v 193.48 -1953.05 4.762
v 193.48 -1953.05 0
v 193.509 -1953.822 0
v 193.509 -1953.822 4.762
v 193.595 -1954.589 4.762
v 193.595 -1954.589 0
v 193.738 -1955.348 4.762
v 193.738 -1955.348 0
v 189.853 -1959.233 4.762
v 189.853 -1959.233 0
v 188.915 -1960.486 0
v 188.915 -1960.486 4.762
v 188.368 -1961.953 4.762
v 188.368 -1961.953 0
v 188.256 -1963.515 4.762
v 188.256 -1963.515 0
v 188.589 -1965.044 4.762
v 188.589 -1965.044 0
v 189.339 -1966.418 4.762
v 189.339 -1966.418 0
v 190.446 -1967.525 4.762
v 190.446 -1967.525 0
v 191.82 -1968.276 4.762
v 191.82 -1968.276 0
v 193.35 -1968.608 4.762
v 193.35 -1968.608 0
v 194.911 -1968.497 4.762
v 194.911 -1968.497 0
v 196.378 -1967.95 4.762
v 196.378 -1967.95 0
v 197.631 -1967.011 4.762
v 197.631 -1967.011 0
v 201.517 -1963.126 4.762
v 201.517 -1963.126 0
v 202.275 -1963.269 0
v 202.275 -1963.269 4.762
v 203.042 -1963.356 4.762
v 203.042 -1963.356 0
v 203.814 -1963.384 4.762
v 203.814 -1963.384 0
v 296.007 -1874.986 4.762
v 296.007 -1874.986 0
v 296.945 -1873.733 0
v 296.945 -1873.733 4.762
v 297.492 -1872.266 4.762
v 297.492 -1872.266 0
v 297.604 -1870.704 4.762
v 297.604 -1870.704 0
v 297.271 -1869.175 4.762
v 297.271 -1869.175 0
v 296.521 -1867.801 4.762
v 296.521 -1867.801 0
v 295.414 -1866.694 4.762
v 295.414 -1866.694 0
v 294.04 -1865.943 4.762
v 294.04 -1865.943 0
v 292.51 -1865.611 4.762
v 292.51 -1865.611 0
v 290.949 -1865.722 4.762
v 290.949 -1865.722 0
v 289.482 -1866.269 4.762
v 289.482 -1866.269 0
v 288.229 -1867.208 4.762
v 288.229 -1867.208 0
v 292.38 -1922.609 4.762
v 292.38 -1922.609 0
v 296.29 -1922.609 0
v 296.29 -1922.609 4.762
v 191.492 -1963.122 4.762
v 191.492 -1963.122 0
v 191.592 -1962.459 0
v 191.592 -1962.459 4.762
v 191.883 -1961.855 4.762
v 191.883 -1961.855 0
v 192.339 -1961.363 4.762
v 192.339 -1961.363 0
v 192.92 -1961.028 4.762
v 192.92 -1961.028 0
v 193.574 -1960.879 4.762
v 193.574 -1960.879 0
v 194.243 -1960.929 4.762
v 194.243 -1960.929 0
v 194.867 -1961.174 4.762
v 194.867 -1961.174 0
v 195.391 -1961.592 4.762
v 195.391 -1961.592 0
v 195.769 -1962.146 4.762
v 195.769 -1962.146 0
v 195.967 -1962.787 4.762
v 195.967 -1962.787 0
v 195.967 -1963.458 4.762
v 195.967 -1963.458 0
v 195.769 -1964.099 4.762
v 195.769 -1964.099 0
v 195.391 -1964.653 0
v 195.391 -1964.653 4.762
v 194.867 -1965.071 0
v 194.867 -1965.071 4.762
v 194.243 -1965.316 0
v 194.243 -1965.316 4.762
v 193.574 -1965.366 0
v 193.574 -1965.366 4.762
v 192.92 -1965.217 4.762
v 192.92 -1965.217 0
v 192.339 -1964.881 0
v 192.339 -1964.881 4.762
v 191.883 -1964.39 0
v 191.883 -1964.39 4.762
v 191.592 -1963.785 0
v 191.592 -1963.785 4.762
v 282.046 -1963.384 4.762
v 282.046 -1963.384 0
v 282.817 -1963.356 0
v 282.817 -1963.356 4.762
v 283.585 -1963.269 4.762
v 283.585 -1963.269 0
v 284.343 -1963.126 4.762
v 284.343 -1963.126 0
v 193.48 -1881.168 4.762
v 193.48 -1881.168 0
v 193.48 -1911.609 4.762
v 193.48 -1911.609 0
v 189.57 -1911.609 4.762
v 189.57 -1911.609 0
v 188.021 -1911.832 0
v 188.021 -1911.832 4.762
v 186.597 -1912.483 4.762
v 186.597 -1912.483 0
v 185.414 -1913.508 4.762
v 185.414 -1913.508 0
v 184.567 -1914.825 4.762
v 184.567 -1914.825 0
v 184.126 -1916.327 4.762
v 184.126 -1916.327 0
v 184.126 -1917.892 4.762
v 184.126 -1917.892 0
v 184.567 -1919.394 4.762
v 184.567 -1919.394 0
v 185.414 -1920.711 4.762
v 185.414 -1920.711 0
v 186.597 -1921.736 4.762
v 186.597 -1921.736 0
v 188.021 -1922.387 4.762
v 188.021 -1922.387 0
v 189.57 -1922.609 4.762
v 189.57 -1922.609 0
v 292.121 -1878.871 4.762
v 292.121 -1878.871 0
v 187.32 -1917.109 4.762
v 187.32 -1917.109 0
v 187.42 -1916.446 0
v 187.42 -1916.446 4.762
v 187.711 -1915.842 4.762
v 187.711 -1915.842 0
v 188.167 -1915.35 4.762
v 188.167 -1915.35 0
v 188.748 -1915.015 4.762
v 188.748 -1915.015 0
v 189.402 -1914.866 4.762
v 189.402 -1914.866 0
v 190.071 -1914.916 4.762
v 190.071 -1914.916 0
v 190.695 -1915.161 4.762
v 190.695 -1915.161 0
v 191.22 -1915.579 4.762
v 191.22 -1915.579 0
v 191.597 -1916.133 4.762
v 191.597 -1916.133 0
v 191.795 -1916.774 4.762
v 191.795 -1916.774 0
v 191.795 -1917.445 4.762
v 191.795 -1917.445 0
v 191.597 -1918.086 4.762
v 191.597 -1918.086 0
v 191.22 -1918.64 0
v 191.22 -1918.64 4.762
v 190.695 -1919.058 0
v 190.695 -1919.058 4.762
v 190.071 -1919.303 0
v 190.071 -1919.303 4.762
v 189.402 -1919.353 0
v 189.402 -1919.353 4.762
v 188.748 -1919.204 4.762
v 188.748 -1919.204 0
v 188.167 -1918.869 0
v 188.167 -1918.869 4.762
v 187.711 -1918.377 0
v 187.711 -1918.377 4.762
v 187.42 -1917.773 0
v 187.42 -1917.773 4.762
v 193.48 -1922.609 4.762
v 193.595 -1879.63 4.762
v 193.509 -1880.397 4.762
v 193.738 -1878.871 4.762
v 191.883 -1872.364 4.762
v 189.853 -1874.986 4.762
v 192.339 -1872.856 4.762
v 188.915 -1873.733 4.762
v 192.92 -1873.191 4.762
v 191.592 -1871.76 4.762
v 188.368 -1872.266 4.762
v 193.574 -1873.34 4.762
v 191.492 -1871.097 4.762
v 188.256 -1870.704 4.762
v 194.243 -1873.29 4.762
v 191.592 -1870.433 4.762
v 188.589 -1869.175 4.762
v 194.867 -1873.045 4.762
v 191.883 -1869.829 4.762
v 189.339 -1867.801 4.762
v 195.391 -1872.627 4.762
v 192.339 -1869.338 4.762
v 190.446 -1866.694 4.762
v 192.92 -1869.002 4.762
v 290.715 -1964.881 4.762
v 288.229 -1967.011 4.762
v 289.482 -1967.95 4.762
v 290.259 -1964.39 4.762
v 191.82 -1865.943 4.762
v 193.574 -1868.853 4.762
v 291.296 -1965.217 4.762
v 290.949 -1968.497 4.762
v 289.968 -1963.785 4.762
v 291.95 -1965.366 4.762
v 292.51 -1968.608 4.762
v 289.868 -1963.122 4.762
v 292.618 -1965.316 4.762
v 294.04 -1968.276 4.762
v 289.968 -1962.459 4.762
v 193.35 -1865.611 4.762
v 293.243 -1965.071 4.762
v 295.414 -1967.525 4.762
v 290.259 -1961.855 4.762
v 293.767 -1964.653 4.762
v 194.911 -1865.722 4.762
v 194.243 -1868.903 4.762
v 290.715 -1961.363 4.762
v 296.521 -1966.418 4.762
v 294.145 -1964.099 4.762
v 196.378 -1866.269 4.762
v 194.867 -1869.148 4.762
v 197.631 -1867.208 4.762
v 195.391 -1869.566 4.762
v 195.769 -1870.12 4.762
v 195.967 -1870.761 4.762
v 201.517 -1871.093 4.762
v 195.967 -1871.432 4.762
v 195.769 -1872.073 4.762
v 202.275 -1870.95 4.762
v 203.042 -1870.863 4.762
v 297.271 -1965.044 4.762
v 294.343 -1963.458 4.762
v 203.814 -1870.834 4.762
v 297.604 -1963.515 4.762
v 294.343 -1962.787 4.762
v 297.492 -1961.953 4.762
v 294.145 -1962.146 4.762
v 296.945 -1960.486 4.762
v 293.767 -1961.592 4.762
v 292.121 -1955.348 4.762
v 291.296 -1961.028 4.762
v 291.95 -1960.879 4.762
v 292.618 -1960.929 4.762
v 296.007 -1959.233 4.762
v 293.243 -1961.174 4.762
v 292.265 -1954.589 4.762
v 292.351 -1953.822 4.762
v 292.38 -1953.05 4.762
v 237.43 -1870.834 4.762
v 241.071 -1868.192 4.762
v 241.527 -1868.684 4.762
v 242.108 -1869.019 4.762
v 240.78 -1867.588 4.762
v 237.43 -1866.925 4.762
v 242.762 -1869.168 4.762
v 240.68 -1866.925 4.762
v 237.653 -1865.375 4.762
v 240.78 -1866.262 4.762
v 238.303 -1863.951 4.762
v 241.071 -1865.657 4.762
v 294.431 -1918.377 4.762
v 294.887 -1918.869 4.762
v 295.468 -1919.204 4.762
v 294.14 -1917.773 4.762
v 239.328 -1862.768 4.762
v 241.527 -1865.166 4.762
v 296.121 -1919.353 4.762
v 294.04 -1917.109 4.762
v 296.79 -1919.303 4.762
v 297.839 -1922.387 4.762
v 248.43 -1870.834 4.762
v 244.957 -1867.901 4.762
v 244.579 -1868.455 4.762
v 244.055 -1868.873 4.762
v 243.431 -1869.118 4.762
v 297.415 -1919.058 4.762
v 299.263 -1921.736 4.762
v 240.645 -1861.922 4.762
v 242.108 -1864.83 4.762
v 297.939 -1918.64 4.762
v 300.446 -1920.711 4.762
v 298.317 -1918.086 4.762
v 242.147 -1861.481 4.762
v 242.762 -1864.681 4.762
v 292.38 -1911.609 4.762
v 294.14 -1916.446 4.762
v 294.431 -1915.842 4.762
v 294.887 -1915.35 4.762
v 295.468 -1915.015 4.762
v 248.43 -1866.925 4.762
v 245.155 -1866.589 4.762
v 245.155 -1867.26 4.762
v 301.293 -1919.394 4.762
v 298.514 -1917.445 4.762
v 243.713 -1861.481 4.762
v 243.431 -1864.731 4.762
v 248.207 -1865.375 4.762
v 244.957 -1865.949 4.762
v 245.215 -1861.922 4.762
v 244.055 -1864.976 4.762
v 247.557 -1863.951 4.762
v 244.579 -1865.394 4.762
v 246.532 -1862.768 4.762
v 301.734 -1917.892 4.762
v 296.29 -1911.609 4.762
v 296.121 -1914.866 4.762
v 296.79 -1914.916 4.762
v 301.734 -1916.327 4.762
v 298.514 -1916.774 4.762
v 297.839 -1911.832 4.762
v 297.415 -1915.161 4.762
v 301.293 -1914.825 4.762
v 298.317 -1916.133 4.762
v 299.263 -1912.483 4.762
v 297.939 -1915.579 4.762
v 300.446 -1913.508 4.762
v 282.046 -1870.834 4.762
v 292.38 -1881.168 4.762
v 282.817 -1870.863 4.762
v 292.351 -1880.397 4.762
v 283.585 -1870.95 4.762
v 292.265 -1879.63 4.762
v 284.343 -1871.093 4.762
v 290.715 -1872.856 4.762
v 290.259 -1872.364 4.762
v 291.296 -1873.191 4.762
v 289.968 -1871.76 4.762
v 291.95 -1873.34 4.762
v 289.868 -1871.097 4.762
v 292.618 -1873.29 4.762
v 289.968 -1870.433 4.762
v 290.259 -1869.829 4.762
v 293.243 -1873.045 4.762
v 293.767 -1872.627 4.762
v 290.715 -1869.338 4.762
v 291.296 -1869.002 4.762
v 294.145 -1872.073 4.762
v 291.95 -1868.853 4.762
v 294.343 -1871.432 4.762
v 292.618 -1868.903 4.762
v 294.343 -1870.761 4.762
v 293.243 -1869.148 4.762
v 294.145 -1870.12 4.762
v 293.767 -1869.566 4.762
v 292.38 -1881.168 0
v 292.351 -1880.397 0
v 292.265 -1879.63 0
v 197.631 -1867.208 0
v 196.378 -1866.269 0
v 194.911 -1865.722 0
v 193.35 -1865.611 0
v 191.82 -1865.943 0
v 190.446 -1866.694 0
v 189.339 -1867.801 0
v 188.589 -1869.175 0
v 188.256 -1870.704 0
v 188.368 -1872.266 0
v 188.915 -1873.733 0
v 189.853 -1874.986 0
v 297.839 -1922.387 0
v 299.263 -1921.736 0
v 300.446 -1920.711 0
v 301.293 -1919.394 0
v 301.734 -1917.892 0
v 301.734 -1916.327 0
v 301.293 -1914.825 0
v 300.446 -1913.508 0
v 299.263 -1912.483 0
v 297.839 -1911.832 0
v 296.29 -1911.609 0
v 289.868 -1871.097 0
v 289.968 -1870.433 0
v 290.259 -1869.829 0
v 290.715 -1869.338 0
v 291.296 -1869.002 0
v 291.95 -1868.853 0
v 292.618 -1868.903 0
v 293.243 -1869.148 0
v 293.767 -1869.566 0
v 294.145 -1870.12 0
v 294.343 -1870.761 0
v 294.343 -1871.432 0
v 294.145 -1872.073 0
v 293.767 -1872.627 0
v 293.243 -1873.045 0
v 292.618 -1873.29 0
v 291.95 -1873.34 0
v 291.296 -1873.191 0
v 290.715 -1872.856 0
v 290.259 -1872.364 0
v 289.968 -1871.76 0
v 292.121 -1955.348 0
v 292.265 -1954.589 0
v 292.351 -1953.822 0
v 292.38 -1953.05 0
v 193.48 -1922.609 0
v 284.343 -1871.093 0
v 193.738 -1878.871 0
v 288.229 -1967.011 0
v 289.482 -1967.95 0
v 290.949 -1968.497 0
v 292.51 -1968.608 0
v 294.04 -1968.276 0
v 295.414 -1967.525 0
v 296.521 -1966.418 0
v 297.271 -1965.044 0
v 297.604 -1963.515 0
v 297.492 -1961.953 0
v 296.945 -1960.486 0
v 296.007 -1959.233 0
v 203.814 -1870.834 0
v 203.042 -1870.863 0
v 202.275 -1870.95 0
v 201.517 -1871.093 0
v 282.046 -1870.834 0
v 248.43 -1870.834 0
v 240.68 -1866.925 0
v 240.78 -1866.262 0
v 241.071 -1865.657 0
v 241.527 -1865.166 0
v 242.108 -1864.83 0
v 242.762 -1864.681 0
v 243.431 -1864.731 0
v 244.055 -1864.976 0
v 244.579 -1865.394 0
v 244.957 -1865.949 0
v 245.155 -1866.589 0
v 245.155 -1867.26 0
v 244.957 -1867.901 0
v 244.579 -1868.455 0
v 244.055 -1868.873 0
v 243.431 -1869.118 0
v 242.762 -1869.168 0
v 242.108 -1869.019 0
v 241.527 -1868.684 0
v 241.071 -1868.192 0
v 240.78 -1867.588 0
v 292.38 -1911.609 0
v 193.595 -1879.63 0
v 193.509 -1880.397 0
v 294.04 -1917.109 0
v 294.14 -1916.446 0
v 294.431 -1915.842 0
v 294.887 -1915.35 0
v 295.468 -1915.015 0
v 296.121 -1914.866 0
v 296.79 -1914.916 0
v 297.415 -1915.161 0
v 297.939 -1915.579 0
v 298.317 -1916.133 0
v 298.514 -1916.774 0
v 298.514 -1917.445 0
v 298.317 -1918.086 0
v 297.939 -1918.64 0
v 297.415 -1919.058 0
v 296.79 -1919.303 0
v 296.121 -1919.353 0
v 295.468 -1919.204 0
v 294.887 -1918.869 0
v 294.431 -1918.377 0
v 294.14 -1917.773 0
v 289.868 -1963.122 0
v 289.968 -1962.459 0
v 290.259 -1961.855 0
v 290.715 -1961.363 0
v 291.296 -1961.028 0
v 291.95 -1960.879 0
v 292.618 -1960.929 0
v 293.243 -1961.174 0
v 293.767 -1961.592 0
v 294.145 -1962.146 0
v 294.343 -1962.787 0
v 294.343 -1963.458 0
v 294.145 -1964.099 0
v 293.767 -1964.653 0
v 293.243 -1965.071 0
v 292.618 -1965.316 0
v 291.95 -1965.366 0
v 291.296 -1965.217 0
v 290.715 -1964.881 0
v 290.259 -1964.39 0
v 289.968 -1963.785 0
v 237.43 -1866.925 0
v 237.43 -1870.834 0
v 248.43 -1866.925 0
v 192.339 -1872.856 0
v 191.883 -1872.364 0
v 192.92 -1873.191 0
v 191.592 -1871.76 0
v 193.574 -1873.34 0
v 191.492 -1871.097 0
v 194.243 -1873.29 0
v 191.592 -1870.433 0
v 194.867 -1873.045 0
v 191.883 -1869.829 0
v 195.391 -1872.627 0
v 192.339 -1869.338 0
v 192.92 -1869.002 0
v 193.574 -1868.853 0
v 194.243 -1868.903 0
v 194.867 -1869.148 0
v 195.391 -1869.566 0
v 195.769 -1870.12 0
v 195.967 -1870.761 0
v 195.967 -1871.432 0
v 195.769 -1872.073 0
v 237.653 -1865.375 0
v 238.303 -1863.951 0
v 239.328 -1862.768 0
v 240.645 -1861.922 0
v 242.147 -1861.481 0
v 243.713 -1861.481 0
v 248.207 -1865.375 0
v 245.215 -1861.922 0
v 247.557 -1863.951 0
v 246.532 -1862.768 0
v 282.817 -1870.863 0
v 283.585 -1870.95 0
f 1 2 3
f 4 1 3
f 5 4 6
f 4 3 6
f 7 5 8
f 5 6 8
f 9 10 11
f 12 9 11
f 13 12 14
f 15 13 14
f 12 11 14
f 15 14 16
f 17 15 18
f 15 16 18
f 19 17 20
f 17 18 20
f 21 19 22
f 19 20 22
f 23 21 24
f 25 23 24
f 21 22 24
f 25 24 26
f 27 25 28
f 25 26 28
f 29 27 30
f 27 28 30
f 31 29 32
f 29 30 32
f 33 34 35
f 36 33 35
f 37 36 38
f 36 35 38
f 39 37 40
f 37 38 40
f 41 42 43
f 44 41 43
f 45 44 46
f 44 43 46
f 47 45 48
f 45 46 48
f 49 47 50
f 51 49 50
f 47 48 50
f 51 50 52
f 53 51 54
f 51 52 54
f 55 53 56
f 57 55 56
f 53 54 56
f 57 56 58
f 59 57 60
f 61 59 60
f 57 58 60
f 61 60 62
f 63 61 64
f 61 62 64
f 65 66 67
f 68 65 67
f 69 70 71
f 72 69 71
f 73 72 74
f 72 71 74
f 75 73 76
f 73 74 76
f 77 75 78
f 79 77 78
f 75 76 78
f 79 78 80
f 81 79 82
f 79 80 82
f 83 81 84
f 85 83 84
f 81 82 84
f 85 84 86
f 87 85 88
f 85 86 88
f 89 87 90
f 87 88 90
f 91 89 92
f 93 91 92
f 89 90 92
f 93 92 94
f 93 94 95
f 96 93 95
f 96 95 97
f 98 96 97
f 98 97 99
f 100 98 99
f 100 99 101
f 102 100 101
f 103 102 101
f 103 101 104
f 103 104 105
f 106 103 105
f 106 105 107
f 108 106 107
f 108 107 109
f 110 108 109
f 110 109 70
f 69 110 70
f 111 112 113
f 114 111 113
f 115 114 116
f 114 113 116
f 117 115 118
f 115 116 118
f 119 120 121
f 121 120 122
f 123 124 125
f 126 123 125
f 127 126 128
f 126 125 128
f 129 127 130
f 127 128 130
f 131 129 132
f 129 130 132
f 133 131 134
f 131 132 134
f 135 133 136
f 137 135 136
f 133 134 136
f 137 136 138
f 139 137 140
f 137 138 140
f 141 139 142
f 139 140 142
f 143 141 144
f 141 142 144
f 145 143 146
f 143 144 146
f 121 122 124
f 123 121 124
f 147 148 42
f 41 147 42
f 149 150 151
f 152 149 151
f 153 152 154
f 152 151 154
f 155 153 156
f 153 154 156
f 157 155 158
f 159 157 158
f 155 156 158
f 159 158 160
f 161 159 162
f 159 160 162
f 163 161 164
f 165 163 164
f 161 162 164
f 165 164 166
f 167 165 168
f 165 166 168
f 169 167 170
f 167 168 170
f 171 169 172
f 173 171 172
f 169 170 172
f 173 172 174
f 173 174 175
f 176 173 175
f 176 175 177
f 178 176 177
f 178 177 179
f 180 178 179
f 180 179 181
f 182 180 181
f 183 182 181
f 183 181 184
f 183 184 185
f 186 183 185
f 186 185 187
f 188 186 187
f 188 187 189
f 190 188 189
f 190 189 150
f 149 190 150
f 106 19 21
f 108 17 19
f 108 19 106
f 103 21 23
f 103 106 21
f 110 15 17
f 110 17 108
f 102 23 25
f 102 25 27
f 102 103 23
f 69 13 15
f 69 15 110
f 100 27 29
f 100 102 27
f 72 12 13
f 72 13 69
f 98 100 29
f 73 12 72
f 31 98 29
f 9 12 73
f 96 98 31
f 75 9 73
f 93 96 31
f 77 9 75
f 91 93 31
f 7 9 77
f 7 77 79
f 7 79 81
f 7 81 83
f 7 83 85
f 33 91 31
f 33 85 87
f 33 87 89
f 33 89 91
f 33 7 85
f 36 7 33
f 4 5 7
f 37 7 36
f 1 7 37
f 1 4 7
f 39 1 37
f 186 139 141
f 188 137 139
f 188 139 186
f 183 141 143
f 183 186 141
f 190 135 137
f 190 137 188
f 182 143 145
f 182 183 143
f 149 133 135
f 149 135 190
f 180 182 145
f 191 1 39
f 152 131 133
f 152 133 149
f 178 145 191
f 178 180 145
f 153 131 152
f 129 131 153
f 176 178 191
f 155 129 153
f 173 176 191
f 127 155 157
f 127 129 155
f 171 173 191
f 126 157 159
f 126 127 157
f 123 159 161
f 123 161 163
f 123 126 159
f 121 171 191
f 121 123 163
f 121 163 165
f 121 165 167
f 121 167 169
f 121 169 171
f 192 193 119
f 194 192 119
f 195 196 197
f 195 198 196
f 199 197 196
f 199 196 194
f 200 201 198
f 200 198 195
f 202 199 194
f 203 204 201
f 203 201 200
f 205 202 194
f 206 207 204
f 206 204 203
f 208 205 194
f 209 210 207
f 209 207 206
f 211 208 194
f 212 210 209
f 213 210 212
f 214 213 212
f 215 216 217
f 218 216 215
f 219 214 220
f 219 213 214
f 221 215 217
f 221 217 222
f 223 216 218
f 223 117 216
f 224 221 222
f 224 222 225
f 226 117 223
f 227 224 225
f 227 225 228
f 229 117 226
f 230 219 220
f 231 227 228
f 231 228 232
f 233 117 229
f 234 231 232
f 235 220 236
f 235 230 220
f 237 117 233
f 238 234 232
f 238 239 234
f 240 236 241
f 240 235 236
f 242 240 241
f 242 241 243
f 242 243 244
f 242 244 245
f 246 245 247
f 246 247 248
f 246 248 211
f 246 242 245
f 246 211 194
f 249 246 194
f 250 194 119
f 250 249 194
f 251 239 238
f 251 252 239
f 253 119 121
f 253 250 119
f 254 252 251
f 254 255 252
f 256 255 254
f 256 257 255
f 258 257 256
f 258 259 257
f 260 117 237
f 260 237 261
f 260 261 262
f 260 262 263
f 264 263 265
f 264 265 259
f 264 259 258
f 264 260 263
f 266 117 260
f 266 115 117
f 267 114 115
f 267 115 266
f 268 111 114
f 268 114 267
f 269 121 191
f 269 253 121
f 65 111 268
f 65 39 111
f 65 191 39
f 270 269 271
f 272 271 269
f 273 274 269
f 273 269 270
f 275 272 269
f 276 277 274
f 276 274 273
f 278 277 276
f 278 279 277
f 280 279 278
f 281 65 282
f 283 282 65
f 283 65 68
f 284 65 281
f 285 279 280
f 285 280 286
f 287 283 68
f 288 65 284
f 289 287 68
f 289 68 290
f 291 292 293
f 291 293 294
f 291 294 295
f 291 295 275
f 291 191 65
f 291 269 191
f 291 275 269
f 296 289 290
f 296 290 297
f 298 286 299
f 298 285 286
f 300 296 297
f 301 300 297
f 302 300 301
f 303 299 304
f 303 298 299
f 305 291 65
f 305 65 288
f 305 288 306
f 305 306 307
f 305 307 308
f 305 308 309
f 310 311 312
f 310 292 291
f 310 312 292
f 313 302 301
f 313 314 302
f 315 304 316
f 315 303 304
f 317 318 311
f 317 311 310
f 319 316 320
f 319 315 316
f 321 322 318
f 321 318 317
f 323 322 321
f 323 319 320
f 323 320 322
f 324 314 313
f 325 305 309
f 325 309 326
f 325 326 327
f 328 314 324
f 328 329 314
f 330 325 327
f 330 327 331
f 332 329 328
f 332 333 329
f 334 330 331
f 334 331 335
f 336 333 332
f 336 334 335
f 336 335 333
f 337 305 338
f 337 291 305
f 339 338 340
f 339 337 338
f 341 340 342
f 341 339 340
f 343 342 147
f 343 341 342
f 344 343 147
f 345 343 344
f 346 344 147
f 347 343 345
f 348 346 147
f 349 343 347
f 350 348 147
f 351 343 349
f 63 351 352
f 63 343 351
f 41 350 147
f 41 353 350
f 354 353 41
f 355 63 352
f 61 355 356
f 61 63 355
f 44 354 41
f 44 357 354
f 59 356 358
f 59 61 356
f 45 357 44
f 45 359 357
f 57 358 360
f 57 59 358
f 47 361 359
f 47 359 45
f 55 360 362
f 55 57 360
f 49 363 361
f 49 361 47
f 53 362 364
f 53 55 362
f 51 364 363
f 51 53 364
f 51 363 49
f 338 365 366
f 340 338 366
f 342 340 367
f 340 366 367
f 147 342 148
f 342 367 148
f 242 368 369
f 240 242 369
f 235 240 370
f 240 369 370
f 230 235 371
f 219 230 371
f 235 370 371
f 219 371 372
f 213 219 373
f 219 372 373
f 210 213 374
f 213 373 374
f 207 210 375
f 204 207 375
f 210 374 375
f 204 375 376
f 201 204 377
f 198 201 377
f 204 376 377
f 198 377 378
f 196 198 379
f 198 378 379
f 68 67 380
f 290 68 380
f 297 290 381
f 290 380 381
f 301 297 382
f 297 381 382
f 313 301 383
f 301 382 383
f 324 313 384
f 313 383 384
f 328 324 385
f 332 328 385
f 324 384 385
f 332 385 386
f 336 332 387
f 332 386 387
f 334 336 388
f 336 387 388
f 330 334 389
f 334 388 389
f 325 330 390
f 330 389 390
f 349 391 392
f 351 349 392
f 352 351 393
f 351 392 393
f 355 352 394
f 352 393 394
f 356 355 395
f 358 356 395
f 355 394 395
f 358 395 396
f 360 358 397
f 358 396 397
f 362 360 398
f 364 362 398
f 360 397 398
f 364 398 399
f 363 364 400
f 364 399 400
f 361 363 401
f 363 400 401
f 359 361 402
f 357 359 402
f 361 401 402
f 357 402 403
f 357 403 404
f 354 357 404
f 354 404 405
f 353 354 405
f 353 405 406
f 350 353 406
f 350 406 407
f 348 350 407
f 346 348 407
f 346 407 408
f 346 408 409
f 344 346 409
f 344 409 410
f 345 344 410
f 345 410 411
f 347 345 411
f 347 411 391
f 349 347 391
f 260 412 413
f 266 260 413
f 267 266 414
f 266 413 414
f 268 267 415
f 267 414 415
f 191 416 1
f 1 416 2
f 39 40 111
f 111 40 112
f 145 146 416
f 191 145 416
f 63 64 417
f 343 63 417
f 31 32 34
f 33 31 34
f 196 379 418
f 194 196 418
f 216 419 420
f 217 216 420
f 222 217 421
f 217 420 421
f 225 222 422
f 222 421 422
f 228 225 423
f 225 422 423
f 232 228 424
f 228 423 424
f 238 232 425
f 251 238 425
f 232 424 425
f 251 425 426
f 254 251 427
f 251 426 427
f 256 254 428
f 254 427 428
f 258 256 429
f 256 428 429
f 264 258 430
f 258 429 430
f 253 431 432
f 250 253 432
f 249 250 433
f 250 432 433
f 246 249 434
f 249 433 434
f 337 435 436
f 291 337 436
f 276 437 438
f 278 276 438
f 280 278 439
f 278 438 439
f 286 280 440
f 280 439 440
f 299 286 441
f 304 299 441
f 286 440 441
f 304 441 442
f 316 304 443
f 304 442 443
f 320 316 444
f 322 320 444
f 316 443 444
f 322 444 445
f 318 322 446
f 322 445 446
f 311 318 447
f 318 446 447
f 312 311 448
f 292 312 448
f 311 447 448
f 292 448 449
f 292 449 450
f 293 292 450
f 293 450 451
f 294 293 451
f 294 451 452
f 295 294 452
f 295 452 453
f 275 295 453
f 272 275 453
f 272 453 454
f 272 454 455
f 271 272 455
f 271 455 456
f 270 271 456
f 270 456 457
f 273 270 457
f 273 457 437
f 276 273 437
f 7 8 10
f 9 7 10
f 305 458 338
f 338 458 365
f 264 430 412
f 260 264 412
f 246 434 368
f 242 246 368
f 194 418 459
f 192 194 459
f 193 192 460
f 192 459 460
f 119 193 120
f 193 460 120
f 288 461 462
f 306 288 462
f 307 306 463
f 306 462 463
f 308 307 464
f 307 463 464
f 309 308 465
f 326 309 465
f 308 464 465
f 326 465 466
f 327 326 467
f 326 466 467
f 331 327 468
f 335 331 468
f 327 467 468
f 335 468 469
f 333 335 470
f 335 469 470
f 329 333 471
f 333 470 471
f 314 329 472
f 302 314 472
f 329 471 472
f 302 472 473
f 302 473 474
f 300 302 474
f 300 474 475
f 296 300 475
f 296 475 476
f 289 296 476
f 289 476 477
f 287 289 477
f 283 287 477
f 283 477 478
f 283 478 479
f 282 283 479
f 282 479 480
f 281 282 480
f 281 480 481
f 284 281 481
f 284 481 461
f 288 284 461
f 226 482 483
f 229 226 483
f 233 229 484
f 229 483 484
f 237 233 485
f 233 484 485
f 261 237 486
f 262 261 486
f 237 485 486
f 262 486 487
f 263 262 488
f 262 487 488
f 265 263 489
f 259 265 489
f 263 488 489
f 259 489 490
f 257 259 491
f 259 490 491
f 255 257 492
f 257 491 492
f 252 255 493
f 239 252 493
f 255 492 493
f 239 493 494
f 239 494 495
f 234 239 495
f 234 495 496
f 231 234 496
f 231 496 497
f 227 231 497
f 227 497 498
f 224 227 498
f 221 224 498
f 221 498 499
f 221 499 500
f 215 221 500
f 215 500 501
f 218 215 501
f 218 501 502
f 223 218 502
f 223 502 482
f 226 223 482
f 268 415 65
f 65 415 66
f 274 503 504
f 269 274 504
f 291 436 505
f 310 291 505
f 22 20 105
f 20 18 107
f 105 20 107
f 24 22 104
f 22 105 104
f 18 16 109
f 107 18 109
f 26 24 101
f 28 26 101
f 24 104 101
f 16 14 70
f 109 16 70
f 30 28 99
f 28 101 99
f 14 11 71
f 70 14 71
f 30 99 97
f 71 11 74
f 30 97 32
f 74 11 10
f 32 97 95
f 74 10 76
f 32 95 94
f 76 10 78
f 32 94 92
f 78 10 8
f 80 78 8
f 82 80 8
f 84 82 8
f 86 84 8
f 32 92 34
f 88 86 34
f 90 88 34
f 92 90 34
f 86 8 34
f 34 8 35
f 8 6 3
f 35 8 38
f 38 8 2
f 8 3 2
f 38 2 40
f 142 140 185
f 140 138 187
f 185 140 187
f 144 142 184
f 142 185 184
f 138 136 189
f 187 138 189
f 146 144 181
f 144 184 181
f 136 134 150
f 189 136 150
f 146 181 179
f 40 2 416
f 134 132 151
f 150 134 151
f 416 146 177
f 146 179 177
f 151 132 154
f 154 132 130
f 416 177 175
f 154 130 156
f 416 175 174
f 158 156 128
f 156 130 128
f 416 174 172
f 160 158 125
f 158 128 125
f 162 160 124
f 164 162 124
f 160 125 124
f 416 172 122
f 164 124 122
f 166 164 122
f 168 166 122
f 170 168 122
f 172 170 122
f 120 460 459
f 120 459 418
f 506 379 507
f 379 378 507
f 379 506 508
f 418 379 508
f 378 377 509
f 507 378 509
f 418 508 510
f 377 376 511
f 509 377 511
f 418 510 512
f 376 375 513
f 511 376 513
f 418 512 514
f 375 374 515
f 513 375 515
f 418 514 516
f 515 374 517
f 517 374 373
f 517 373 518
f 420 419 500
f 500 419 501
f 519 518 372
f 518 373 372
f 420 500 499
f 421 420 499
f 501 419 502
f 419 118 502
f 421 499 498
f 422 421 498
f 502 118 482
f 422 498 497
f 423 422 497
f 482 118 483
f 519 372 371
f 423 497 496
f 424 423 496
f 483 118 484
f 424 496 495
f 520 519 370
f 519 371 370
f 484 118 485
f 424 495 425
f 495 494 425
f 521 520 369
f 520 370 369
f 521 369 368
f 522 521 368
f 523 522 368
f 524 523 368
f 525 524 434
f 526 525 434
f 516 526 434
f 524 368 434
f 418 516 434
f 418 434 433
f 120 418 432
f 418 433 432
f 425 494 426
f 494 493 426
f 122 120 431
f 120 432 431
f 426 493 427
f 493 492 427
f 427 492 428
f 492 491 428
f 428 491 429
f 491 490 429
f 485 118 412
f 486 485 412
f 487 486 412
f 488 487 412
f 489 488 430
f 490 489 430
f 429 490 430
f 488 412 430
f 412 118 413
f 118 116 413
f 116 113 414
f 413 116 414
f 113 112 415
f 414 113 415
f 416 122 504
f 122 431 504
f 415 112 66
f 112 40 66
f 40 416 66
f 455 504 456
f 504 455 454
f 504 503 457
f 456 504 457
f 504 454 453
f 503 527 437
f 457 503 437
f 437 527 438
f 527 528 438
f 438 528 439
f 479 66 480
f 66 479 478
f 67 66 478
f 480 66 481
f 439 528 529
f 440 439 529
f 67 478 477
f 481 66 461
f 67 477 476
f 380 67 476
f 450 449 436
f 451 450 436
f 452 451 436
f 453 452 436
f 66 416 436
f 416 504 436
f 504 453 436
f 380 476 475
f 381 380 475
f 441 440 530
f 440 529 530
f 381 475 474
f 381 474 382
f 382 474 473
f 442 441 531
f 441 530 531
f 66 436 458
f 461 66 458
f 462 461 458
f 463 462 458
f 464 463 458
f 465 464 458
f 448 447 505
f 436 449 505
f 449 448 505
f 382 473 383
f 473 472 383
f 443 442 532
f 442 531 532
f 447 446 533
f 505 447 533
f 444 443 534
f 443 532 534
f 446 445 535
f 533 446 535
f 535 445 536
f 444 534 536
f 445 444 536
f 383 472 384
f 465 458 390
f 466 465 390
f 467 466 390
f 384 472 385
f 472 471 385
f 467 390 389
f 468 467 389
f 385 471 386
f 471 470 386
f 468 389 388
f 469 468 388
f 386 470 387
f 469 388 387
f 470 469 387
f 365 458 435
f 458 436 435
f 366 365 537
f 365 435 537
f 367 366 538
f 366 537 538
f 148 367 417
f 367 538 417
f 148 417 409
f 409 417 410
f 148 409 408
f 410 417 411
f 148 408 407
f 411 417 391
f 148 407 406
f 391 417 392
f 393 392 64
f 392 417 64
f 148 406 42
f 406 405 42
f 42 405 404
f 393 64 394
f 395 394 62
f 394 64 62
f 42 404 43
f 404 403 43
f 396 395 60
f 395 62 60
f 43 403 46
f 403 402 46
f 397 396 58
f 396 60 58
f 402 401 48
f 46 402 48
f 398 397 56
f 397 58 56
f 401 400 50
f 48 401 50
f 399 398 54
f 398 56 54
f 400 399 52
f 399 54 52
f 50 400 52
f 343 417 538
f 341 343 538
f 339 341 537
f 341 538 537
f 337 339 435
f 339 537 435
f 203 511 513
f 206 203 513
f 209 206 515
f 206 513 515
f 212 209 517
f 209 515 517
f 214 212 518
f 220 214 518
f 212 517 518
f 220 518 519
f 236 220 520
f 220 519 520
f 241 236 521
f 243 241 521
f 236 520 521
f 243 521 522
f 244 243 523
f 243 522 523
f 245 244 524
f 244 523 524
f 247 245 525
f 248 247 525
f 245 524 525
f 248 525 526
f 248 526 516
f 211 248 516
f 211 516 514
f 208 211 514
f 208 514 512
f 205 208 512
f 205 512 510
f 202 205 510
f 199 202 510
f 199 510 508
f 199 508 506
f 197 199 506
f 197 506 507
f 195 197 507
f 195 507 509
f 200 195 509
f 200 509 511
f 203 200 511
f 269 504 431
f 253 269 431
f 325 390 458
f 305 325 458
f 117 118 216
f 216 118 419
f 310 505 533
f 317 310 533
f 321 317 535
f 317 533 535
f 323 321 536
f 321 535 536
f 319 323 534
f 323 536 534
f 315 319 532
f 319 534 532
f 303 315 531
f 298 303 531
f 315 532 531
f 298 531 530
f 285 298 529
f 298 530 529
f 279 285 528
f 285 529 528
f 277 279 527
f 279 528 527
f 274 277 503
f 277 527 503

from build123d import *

# Parameters (mm, degrees)
BOSS_EXTRUDE1_DEPTH  = 4.7625
M4_CLEARANCE_HOLE1_D = 4.5


with BuildPart() as part:
    # Sketch1 → Boss-Extrude1 (new body)
    with BuildSketch(Plane.XY):
        with BuildLine():
            Line((288.228651321, -1867.207577199), (284.343172474, -1871.093056046))
            ThreePointArc((284.343172474, -1871.093056046), (283.201800398, -1870.89932849), (282.045921758, -1870.834481355))
            Line((282.045921758, -1870.834481355), (248.429921758, -1870.834481355))
            Line((248.429921758, -1870.834481355), (248.429921758, -1866.924781355))
            ThreePointArc((248.429921758, -1866.924781355), (242.929921758, -1861.424781355), (237.429921758, -1866.924781355))
            Line((237.429921758, -1866.924781355), (237.429921758, -1870.834481355))
            Line((237.429921758, -1870.834481355), (203.813921758, -1870.834481355))
            ThreePointArc((203.813921758, -1870.834481355), (202.658043118, -1870.89932849), (201.516671043, -1871.093056046))
            Line((201.516671043, -1871.093056046), (197.631192196, -1867.207577199))
            ThreePointArc((197.631192196, -1867.207577199), (189.853017603, -1867.207577199), (189.853017603, -1874.985751792))
            Line((189.853017603, -1874.985751792), (193.73849645, -1878.871230639))
            ThreePointArc((193.73849645, -1878.871230639), (193.544768893, -1880.012602715), (193.479921758, -1881.168481355))
            Line((193.479921758, -1881.168481355), (193.479921758, -1911.609481355))
            Line((193.479921758, -1911.609481355), (189.570221758, -1911.609481355))
            ThreePointArc((189.570221758, -1911.609481355), (184.070221758, -1917.109481355), (189.570221758, -1922.609481355))
            Line((189.570221758, -1922.609481355), (193.479921758, -1922.609481355))
            Line((193.479921758, -1922.609481355), (193.479921758, -1953.050481355))
            ThreePointArc((193.479921758, -1953.050481355), (193.544768893, -1954.206359995), (193.73849645, -1955.347732071))
            Line((193.73849645, -1955.347732071), (189.853017603, -1959.233210918))
            ThreePointArc((189.853017603, -1959.233210918), (189.853017603, -1967.011385511), (197.631192196, -1967.011385511))
            Line((197.631192196, -1967.011385511), (201.516671043, -1963.125906664))
            ThreePointArc((201.516671043, -1963.125906664), (202.658043118, -1963.31963422), (203.813921758, -1963.384481355))
            Line((203.813921758, -1963.384481355), (282.045921758, -1963.384481355))
            ThreePointArc((282.045921758, -1963.384481355), (283.201800398, -1963.31963422), (284.343172474, -1963.125906664))
            Line((284.343172474, -1963.125906664), (288.228651321, -1967.011385511))
            ThreePointArc((288.228651321, -1967.011385511), (296.006825914, -1967.011385511), (296.006825914, -1959.233210918))
            Line((296.006825914, -1959.233210918), (292.121347067, -1955.347732071))
            ThreePointArc((292.121347067, -1955.347732071), (292.315074623, -1954.206359995), (292.379921758, -1953.050481355))
            Line((292.379921758, -1953.050481355), (292.379921758, -1922.609481355))
            Line((292.379921758, -1922.609481355), (296.289621758, -1922.609481355))
            ThreePointArc((296.289621758, -1922.609481355), (301.789621758, -1917.109481355), (296.289621758, -1911.609481355))
            Line((296.289621758, -1911.609481355), (292.379921758, -1911.609481355))
            Line((292.379921758, -1911.609481355), (292.379921758, -1881.168481355))
            ThreePointArc((292.379921758, -1881.168481355), (292.315074623, -1880.012602715), (292.121347067, -1878.871230639))
            Line((292.121347067, -1878.871230639), (296.006825914, -1874.985751792))
            ThreePointArc((296.006825914, -1874.985751792), (296.006825914, -1867.207577199), (288.228651321, -1867.207577199))
        make_face()
    extrude(amount=BOSS_EXTRUDE1_DEPTH)

    # M4 Clearance Hole1 (through all)
    with Locations(Plane.XY.offset(4.7625)):
        with Locations((193.742104899, -1963.122298214), (189.570221758, -1917.109481355), (193.742104899, -1871.096664496), (242.929921758, -1866.924781355), (292.117738617, -1871.096664496), (296.289621758, -1917.109481355), (292.117738617, -1963.122298214)):
            Hole(M4_CLEARANCE_HOLE1_D / 2)


solid = part.part
